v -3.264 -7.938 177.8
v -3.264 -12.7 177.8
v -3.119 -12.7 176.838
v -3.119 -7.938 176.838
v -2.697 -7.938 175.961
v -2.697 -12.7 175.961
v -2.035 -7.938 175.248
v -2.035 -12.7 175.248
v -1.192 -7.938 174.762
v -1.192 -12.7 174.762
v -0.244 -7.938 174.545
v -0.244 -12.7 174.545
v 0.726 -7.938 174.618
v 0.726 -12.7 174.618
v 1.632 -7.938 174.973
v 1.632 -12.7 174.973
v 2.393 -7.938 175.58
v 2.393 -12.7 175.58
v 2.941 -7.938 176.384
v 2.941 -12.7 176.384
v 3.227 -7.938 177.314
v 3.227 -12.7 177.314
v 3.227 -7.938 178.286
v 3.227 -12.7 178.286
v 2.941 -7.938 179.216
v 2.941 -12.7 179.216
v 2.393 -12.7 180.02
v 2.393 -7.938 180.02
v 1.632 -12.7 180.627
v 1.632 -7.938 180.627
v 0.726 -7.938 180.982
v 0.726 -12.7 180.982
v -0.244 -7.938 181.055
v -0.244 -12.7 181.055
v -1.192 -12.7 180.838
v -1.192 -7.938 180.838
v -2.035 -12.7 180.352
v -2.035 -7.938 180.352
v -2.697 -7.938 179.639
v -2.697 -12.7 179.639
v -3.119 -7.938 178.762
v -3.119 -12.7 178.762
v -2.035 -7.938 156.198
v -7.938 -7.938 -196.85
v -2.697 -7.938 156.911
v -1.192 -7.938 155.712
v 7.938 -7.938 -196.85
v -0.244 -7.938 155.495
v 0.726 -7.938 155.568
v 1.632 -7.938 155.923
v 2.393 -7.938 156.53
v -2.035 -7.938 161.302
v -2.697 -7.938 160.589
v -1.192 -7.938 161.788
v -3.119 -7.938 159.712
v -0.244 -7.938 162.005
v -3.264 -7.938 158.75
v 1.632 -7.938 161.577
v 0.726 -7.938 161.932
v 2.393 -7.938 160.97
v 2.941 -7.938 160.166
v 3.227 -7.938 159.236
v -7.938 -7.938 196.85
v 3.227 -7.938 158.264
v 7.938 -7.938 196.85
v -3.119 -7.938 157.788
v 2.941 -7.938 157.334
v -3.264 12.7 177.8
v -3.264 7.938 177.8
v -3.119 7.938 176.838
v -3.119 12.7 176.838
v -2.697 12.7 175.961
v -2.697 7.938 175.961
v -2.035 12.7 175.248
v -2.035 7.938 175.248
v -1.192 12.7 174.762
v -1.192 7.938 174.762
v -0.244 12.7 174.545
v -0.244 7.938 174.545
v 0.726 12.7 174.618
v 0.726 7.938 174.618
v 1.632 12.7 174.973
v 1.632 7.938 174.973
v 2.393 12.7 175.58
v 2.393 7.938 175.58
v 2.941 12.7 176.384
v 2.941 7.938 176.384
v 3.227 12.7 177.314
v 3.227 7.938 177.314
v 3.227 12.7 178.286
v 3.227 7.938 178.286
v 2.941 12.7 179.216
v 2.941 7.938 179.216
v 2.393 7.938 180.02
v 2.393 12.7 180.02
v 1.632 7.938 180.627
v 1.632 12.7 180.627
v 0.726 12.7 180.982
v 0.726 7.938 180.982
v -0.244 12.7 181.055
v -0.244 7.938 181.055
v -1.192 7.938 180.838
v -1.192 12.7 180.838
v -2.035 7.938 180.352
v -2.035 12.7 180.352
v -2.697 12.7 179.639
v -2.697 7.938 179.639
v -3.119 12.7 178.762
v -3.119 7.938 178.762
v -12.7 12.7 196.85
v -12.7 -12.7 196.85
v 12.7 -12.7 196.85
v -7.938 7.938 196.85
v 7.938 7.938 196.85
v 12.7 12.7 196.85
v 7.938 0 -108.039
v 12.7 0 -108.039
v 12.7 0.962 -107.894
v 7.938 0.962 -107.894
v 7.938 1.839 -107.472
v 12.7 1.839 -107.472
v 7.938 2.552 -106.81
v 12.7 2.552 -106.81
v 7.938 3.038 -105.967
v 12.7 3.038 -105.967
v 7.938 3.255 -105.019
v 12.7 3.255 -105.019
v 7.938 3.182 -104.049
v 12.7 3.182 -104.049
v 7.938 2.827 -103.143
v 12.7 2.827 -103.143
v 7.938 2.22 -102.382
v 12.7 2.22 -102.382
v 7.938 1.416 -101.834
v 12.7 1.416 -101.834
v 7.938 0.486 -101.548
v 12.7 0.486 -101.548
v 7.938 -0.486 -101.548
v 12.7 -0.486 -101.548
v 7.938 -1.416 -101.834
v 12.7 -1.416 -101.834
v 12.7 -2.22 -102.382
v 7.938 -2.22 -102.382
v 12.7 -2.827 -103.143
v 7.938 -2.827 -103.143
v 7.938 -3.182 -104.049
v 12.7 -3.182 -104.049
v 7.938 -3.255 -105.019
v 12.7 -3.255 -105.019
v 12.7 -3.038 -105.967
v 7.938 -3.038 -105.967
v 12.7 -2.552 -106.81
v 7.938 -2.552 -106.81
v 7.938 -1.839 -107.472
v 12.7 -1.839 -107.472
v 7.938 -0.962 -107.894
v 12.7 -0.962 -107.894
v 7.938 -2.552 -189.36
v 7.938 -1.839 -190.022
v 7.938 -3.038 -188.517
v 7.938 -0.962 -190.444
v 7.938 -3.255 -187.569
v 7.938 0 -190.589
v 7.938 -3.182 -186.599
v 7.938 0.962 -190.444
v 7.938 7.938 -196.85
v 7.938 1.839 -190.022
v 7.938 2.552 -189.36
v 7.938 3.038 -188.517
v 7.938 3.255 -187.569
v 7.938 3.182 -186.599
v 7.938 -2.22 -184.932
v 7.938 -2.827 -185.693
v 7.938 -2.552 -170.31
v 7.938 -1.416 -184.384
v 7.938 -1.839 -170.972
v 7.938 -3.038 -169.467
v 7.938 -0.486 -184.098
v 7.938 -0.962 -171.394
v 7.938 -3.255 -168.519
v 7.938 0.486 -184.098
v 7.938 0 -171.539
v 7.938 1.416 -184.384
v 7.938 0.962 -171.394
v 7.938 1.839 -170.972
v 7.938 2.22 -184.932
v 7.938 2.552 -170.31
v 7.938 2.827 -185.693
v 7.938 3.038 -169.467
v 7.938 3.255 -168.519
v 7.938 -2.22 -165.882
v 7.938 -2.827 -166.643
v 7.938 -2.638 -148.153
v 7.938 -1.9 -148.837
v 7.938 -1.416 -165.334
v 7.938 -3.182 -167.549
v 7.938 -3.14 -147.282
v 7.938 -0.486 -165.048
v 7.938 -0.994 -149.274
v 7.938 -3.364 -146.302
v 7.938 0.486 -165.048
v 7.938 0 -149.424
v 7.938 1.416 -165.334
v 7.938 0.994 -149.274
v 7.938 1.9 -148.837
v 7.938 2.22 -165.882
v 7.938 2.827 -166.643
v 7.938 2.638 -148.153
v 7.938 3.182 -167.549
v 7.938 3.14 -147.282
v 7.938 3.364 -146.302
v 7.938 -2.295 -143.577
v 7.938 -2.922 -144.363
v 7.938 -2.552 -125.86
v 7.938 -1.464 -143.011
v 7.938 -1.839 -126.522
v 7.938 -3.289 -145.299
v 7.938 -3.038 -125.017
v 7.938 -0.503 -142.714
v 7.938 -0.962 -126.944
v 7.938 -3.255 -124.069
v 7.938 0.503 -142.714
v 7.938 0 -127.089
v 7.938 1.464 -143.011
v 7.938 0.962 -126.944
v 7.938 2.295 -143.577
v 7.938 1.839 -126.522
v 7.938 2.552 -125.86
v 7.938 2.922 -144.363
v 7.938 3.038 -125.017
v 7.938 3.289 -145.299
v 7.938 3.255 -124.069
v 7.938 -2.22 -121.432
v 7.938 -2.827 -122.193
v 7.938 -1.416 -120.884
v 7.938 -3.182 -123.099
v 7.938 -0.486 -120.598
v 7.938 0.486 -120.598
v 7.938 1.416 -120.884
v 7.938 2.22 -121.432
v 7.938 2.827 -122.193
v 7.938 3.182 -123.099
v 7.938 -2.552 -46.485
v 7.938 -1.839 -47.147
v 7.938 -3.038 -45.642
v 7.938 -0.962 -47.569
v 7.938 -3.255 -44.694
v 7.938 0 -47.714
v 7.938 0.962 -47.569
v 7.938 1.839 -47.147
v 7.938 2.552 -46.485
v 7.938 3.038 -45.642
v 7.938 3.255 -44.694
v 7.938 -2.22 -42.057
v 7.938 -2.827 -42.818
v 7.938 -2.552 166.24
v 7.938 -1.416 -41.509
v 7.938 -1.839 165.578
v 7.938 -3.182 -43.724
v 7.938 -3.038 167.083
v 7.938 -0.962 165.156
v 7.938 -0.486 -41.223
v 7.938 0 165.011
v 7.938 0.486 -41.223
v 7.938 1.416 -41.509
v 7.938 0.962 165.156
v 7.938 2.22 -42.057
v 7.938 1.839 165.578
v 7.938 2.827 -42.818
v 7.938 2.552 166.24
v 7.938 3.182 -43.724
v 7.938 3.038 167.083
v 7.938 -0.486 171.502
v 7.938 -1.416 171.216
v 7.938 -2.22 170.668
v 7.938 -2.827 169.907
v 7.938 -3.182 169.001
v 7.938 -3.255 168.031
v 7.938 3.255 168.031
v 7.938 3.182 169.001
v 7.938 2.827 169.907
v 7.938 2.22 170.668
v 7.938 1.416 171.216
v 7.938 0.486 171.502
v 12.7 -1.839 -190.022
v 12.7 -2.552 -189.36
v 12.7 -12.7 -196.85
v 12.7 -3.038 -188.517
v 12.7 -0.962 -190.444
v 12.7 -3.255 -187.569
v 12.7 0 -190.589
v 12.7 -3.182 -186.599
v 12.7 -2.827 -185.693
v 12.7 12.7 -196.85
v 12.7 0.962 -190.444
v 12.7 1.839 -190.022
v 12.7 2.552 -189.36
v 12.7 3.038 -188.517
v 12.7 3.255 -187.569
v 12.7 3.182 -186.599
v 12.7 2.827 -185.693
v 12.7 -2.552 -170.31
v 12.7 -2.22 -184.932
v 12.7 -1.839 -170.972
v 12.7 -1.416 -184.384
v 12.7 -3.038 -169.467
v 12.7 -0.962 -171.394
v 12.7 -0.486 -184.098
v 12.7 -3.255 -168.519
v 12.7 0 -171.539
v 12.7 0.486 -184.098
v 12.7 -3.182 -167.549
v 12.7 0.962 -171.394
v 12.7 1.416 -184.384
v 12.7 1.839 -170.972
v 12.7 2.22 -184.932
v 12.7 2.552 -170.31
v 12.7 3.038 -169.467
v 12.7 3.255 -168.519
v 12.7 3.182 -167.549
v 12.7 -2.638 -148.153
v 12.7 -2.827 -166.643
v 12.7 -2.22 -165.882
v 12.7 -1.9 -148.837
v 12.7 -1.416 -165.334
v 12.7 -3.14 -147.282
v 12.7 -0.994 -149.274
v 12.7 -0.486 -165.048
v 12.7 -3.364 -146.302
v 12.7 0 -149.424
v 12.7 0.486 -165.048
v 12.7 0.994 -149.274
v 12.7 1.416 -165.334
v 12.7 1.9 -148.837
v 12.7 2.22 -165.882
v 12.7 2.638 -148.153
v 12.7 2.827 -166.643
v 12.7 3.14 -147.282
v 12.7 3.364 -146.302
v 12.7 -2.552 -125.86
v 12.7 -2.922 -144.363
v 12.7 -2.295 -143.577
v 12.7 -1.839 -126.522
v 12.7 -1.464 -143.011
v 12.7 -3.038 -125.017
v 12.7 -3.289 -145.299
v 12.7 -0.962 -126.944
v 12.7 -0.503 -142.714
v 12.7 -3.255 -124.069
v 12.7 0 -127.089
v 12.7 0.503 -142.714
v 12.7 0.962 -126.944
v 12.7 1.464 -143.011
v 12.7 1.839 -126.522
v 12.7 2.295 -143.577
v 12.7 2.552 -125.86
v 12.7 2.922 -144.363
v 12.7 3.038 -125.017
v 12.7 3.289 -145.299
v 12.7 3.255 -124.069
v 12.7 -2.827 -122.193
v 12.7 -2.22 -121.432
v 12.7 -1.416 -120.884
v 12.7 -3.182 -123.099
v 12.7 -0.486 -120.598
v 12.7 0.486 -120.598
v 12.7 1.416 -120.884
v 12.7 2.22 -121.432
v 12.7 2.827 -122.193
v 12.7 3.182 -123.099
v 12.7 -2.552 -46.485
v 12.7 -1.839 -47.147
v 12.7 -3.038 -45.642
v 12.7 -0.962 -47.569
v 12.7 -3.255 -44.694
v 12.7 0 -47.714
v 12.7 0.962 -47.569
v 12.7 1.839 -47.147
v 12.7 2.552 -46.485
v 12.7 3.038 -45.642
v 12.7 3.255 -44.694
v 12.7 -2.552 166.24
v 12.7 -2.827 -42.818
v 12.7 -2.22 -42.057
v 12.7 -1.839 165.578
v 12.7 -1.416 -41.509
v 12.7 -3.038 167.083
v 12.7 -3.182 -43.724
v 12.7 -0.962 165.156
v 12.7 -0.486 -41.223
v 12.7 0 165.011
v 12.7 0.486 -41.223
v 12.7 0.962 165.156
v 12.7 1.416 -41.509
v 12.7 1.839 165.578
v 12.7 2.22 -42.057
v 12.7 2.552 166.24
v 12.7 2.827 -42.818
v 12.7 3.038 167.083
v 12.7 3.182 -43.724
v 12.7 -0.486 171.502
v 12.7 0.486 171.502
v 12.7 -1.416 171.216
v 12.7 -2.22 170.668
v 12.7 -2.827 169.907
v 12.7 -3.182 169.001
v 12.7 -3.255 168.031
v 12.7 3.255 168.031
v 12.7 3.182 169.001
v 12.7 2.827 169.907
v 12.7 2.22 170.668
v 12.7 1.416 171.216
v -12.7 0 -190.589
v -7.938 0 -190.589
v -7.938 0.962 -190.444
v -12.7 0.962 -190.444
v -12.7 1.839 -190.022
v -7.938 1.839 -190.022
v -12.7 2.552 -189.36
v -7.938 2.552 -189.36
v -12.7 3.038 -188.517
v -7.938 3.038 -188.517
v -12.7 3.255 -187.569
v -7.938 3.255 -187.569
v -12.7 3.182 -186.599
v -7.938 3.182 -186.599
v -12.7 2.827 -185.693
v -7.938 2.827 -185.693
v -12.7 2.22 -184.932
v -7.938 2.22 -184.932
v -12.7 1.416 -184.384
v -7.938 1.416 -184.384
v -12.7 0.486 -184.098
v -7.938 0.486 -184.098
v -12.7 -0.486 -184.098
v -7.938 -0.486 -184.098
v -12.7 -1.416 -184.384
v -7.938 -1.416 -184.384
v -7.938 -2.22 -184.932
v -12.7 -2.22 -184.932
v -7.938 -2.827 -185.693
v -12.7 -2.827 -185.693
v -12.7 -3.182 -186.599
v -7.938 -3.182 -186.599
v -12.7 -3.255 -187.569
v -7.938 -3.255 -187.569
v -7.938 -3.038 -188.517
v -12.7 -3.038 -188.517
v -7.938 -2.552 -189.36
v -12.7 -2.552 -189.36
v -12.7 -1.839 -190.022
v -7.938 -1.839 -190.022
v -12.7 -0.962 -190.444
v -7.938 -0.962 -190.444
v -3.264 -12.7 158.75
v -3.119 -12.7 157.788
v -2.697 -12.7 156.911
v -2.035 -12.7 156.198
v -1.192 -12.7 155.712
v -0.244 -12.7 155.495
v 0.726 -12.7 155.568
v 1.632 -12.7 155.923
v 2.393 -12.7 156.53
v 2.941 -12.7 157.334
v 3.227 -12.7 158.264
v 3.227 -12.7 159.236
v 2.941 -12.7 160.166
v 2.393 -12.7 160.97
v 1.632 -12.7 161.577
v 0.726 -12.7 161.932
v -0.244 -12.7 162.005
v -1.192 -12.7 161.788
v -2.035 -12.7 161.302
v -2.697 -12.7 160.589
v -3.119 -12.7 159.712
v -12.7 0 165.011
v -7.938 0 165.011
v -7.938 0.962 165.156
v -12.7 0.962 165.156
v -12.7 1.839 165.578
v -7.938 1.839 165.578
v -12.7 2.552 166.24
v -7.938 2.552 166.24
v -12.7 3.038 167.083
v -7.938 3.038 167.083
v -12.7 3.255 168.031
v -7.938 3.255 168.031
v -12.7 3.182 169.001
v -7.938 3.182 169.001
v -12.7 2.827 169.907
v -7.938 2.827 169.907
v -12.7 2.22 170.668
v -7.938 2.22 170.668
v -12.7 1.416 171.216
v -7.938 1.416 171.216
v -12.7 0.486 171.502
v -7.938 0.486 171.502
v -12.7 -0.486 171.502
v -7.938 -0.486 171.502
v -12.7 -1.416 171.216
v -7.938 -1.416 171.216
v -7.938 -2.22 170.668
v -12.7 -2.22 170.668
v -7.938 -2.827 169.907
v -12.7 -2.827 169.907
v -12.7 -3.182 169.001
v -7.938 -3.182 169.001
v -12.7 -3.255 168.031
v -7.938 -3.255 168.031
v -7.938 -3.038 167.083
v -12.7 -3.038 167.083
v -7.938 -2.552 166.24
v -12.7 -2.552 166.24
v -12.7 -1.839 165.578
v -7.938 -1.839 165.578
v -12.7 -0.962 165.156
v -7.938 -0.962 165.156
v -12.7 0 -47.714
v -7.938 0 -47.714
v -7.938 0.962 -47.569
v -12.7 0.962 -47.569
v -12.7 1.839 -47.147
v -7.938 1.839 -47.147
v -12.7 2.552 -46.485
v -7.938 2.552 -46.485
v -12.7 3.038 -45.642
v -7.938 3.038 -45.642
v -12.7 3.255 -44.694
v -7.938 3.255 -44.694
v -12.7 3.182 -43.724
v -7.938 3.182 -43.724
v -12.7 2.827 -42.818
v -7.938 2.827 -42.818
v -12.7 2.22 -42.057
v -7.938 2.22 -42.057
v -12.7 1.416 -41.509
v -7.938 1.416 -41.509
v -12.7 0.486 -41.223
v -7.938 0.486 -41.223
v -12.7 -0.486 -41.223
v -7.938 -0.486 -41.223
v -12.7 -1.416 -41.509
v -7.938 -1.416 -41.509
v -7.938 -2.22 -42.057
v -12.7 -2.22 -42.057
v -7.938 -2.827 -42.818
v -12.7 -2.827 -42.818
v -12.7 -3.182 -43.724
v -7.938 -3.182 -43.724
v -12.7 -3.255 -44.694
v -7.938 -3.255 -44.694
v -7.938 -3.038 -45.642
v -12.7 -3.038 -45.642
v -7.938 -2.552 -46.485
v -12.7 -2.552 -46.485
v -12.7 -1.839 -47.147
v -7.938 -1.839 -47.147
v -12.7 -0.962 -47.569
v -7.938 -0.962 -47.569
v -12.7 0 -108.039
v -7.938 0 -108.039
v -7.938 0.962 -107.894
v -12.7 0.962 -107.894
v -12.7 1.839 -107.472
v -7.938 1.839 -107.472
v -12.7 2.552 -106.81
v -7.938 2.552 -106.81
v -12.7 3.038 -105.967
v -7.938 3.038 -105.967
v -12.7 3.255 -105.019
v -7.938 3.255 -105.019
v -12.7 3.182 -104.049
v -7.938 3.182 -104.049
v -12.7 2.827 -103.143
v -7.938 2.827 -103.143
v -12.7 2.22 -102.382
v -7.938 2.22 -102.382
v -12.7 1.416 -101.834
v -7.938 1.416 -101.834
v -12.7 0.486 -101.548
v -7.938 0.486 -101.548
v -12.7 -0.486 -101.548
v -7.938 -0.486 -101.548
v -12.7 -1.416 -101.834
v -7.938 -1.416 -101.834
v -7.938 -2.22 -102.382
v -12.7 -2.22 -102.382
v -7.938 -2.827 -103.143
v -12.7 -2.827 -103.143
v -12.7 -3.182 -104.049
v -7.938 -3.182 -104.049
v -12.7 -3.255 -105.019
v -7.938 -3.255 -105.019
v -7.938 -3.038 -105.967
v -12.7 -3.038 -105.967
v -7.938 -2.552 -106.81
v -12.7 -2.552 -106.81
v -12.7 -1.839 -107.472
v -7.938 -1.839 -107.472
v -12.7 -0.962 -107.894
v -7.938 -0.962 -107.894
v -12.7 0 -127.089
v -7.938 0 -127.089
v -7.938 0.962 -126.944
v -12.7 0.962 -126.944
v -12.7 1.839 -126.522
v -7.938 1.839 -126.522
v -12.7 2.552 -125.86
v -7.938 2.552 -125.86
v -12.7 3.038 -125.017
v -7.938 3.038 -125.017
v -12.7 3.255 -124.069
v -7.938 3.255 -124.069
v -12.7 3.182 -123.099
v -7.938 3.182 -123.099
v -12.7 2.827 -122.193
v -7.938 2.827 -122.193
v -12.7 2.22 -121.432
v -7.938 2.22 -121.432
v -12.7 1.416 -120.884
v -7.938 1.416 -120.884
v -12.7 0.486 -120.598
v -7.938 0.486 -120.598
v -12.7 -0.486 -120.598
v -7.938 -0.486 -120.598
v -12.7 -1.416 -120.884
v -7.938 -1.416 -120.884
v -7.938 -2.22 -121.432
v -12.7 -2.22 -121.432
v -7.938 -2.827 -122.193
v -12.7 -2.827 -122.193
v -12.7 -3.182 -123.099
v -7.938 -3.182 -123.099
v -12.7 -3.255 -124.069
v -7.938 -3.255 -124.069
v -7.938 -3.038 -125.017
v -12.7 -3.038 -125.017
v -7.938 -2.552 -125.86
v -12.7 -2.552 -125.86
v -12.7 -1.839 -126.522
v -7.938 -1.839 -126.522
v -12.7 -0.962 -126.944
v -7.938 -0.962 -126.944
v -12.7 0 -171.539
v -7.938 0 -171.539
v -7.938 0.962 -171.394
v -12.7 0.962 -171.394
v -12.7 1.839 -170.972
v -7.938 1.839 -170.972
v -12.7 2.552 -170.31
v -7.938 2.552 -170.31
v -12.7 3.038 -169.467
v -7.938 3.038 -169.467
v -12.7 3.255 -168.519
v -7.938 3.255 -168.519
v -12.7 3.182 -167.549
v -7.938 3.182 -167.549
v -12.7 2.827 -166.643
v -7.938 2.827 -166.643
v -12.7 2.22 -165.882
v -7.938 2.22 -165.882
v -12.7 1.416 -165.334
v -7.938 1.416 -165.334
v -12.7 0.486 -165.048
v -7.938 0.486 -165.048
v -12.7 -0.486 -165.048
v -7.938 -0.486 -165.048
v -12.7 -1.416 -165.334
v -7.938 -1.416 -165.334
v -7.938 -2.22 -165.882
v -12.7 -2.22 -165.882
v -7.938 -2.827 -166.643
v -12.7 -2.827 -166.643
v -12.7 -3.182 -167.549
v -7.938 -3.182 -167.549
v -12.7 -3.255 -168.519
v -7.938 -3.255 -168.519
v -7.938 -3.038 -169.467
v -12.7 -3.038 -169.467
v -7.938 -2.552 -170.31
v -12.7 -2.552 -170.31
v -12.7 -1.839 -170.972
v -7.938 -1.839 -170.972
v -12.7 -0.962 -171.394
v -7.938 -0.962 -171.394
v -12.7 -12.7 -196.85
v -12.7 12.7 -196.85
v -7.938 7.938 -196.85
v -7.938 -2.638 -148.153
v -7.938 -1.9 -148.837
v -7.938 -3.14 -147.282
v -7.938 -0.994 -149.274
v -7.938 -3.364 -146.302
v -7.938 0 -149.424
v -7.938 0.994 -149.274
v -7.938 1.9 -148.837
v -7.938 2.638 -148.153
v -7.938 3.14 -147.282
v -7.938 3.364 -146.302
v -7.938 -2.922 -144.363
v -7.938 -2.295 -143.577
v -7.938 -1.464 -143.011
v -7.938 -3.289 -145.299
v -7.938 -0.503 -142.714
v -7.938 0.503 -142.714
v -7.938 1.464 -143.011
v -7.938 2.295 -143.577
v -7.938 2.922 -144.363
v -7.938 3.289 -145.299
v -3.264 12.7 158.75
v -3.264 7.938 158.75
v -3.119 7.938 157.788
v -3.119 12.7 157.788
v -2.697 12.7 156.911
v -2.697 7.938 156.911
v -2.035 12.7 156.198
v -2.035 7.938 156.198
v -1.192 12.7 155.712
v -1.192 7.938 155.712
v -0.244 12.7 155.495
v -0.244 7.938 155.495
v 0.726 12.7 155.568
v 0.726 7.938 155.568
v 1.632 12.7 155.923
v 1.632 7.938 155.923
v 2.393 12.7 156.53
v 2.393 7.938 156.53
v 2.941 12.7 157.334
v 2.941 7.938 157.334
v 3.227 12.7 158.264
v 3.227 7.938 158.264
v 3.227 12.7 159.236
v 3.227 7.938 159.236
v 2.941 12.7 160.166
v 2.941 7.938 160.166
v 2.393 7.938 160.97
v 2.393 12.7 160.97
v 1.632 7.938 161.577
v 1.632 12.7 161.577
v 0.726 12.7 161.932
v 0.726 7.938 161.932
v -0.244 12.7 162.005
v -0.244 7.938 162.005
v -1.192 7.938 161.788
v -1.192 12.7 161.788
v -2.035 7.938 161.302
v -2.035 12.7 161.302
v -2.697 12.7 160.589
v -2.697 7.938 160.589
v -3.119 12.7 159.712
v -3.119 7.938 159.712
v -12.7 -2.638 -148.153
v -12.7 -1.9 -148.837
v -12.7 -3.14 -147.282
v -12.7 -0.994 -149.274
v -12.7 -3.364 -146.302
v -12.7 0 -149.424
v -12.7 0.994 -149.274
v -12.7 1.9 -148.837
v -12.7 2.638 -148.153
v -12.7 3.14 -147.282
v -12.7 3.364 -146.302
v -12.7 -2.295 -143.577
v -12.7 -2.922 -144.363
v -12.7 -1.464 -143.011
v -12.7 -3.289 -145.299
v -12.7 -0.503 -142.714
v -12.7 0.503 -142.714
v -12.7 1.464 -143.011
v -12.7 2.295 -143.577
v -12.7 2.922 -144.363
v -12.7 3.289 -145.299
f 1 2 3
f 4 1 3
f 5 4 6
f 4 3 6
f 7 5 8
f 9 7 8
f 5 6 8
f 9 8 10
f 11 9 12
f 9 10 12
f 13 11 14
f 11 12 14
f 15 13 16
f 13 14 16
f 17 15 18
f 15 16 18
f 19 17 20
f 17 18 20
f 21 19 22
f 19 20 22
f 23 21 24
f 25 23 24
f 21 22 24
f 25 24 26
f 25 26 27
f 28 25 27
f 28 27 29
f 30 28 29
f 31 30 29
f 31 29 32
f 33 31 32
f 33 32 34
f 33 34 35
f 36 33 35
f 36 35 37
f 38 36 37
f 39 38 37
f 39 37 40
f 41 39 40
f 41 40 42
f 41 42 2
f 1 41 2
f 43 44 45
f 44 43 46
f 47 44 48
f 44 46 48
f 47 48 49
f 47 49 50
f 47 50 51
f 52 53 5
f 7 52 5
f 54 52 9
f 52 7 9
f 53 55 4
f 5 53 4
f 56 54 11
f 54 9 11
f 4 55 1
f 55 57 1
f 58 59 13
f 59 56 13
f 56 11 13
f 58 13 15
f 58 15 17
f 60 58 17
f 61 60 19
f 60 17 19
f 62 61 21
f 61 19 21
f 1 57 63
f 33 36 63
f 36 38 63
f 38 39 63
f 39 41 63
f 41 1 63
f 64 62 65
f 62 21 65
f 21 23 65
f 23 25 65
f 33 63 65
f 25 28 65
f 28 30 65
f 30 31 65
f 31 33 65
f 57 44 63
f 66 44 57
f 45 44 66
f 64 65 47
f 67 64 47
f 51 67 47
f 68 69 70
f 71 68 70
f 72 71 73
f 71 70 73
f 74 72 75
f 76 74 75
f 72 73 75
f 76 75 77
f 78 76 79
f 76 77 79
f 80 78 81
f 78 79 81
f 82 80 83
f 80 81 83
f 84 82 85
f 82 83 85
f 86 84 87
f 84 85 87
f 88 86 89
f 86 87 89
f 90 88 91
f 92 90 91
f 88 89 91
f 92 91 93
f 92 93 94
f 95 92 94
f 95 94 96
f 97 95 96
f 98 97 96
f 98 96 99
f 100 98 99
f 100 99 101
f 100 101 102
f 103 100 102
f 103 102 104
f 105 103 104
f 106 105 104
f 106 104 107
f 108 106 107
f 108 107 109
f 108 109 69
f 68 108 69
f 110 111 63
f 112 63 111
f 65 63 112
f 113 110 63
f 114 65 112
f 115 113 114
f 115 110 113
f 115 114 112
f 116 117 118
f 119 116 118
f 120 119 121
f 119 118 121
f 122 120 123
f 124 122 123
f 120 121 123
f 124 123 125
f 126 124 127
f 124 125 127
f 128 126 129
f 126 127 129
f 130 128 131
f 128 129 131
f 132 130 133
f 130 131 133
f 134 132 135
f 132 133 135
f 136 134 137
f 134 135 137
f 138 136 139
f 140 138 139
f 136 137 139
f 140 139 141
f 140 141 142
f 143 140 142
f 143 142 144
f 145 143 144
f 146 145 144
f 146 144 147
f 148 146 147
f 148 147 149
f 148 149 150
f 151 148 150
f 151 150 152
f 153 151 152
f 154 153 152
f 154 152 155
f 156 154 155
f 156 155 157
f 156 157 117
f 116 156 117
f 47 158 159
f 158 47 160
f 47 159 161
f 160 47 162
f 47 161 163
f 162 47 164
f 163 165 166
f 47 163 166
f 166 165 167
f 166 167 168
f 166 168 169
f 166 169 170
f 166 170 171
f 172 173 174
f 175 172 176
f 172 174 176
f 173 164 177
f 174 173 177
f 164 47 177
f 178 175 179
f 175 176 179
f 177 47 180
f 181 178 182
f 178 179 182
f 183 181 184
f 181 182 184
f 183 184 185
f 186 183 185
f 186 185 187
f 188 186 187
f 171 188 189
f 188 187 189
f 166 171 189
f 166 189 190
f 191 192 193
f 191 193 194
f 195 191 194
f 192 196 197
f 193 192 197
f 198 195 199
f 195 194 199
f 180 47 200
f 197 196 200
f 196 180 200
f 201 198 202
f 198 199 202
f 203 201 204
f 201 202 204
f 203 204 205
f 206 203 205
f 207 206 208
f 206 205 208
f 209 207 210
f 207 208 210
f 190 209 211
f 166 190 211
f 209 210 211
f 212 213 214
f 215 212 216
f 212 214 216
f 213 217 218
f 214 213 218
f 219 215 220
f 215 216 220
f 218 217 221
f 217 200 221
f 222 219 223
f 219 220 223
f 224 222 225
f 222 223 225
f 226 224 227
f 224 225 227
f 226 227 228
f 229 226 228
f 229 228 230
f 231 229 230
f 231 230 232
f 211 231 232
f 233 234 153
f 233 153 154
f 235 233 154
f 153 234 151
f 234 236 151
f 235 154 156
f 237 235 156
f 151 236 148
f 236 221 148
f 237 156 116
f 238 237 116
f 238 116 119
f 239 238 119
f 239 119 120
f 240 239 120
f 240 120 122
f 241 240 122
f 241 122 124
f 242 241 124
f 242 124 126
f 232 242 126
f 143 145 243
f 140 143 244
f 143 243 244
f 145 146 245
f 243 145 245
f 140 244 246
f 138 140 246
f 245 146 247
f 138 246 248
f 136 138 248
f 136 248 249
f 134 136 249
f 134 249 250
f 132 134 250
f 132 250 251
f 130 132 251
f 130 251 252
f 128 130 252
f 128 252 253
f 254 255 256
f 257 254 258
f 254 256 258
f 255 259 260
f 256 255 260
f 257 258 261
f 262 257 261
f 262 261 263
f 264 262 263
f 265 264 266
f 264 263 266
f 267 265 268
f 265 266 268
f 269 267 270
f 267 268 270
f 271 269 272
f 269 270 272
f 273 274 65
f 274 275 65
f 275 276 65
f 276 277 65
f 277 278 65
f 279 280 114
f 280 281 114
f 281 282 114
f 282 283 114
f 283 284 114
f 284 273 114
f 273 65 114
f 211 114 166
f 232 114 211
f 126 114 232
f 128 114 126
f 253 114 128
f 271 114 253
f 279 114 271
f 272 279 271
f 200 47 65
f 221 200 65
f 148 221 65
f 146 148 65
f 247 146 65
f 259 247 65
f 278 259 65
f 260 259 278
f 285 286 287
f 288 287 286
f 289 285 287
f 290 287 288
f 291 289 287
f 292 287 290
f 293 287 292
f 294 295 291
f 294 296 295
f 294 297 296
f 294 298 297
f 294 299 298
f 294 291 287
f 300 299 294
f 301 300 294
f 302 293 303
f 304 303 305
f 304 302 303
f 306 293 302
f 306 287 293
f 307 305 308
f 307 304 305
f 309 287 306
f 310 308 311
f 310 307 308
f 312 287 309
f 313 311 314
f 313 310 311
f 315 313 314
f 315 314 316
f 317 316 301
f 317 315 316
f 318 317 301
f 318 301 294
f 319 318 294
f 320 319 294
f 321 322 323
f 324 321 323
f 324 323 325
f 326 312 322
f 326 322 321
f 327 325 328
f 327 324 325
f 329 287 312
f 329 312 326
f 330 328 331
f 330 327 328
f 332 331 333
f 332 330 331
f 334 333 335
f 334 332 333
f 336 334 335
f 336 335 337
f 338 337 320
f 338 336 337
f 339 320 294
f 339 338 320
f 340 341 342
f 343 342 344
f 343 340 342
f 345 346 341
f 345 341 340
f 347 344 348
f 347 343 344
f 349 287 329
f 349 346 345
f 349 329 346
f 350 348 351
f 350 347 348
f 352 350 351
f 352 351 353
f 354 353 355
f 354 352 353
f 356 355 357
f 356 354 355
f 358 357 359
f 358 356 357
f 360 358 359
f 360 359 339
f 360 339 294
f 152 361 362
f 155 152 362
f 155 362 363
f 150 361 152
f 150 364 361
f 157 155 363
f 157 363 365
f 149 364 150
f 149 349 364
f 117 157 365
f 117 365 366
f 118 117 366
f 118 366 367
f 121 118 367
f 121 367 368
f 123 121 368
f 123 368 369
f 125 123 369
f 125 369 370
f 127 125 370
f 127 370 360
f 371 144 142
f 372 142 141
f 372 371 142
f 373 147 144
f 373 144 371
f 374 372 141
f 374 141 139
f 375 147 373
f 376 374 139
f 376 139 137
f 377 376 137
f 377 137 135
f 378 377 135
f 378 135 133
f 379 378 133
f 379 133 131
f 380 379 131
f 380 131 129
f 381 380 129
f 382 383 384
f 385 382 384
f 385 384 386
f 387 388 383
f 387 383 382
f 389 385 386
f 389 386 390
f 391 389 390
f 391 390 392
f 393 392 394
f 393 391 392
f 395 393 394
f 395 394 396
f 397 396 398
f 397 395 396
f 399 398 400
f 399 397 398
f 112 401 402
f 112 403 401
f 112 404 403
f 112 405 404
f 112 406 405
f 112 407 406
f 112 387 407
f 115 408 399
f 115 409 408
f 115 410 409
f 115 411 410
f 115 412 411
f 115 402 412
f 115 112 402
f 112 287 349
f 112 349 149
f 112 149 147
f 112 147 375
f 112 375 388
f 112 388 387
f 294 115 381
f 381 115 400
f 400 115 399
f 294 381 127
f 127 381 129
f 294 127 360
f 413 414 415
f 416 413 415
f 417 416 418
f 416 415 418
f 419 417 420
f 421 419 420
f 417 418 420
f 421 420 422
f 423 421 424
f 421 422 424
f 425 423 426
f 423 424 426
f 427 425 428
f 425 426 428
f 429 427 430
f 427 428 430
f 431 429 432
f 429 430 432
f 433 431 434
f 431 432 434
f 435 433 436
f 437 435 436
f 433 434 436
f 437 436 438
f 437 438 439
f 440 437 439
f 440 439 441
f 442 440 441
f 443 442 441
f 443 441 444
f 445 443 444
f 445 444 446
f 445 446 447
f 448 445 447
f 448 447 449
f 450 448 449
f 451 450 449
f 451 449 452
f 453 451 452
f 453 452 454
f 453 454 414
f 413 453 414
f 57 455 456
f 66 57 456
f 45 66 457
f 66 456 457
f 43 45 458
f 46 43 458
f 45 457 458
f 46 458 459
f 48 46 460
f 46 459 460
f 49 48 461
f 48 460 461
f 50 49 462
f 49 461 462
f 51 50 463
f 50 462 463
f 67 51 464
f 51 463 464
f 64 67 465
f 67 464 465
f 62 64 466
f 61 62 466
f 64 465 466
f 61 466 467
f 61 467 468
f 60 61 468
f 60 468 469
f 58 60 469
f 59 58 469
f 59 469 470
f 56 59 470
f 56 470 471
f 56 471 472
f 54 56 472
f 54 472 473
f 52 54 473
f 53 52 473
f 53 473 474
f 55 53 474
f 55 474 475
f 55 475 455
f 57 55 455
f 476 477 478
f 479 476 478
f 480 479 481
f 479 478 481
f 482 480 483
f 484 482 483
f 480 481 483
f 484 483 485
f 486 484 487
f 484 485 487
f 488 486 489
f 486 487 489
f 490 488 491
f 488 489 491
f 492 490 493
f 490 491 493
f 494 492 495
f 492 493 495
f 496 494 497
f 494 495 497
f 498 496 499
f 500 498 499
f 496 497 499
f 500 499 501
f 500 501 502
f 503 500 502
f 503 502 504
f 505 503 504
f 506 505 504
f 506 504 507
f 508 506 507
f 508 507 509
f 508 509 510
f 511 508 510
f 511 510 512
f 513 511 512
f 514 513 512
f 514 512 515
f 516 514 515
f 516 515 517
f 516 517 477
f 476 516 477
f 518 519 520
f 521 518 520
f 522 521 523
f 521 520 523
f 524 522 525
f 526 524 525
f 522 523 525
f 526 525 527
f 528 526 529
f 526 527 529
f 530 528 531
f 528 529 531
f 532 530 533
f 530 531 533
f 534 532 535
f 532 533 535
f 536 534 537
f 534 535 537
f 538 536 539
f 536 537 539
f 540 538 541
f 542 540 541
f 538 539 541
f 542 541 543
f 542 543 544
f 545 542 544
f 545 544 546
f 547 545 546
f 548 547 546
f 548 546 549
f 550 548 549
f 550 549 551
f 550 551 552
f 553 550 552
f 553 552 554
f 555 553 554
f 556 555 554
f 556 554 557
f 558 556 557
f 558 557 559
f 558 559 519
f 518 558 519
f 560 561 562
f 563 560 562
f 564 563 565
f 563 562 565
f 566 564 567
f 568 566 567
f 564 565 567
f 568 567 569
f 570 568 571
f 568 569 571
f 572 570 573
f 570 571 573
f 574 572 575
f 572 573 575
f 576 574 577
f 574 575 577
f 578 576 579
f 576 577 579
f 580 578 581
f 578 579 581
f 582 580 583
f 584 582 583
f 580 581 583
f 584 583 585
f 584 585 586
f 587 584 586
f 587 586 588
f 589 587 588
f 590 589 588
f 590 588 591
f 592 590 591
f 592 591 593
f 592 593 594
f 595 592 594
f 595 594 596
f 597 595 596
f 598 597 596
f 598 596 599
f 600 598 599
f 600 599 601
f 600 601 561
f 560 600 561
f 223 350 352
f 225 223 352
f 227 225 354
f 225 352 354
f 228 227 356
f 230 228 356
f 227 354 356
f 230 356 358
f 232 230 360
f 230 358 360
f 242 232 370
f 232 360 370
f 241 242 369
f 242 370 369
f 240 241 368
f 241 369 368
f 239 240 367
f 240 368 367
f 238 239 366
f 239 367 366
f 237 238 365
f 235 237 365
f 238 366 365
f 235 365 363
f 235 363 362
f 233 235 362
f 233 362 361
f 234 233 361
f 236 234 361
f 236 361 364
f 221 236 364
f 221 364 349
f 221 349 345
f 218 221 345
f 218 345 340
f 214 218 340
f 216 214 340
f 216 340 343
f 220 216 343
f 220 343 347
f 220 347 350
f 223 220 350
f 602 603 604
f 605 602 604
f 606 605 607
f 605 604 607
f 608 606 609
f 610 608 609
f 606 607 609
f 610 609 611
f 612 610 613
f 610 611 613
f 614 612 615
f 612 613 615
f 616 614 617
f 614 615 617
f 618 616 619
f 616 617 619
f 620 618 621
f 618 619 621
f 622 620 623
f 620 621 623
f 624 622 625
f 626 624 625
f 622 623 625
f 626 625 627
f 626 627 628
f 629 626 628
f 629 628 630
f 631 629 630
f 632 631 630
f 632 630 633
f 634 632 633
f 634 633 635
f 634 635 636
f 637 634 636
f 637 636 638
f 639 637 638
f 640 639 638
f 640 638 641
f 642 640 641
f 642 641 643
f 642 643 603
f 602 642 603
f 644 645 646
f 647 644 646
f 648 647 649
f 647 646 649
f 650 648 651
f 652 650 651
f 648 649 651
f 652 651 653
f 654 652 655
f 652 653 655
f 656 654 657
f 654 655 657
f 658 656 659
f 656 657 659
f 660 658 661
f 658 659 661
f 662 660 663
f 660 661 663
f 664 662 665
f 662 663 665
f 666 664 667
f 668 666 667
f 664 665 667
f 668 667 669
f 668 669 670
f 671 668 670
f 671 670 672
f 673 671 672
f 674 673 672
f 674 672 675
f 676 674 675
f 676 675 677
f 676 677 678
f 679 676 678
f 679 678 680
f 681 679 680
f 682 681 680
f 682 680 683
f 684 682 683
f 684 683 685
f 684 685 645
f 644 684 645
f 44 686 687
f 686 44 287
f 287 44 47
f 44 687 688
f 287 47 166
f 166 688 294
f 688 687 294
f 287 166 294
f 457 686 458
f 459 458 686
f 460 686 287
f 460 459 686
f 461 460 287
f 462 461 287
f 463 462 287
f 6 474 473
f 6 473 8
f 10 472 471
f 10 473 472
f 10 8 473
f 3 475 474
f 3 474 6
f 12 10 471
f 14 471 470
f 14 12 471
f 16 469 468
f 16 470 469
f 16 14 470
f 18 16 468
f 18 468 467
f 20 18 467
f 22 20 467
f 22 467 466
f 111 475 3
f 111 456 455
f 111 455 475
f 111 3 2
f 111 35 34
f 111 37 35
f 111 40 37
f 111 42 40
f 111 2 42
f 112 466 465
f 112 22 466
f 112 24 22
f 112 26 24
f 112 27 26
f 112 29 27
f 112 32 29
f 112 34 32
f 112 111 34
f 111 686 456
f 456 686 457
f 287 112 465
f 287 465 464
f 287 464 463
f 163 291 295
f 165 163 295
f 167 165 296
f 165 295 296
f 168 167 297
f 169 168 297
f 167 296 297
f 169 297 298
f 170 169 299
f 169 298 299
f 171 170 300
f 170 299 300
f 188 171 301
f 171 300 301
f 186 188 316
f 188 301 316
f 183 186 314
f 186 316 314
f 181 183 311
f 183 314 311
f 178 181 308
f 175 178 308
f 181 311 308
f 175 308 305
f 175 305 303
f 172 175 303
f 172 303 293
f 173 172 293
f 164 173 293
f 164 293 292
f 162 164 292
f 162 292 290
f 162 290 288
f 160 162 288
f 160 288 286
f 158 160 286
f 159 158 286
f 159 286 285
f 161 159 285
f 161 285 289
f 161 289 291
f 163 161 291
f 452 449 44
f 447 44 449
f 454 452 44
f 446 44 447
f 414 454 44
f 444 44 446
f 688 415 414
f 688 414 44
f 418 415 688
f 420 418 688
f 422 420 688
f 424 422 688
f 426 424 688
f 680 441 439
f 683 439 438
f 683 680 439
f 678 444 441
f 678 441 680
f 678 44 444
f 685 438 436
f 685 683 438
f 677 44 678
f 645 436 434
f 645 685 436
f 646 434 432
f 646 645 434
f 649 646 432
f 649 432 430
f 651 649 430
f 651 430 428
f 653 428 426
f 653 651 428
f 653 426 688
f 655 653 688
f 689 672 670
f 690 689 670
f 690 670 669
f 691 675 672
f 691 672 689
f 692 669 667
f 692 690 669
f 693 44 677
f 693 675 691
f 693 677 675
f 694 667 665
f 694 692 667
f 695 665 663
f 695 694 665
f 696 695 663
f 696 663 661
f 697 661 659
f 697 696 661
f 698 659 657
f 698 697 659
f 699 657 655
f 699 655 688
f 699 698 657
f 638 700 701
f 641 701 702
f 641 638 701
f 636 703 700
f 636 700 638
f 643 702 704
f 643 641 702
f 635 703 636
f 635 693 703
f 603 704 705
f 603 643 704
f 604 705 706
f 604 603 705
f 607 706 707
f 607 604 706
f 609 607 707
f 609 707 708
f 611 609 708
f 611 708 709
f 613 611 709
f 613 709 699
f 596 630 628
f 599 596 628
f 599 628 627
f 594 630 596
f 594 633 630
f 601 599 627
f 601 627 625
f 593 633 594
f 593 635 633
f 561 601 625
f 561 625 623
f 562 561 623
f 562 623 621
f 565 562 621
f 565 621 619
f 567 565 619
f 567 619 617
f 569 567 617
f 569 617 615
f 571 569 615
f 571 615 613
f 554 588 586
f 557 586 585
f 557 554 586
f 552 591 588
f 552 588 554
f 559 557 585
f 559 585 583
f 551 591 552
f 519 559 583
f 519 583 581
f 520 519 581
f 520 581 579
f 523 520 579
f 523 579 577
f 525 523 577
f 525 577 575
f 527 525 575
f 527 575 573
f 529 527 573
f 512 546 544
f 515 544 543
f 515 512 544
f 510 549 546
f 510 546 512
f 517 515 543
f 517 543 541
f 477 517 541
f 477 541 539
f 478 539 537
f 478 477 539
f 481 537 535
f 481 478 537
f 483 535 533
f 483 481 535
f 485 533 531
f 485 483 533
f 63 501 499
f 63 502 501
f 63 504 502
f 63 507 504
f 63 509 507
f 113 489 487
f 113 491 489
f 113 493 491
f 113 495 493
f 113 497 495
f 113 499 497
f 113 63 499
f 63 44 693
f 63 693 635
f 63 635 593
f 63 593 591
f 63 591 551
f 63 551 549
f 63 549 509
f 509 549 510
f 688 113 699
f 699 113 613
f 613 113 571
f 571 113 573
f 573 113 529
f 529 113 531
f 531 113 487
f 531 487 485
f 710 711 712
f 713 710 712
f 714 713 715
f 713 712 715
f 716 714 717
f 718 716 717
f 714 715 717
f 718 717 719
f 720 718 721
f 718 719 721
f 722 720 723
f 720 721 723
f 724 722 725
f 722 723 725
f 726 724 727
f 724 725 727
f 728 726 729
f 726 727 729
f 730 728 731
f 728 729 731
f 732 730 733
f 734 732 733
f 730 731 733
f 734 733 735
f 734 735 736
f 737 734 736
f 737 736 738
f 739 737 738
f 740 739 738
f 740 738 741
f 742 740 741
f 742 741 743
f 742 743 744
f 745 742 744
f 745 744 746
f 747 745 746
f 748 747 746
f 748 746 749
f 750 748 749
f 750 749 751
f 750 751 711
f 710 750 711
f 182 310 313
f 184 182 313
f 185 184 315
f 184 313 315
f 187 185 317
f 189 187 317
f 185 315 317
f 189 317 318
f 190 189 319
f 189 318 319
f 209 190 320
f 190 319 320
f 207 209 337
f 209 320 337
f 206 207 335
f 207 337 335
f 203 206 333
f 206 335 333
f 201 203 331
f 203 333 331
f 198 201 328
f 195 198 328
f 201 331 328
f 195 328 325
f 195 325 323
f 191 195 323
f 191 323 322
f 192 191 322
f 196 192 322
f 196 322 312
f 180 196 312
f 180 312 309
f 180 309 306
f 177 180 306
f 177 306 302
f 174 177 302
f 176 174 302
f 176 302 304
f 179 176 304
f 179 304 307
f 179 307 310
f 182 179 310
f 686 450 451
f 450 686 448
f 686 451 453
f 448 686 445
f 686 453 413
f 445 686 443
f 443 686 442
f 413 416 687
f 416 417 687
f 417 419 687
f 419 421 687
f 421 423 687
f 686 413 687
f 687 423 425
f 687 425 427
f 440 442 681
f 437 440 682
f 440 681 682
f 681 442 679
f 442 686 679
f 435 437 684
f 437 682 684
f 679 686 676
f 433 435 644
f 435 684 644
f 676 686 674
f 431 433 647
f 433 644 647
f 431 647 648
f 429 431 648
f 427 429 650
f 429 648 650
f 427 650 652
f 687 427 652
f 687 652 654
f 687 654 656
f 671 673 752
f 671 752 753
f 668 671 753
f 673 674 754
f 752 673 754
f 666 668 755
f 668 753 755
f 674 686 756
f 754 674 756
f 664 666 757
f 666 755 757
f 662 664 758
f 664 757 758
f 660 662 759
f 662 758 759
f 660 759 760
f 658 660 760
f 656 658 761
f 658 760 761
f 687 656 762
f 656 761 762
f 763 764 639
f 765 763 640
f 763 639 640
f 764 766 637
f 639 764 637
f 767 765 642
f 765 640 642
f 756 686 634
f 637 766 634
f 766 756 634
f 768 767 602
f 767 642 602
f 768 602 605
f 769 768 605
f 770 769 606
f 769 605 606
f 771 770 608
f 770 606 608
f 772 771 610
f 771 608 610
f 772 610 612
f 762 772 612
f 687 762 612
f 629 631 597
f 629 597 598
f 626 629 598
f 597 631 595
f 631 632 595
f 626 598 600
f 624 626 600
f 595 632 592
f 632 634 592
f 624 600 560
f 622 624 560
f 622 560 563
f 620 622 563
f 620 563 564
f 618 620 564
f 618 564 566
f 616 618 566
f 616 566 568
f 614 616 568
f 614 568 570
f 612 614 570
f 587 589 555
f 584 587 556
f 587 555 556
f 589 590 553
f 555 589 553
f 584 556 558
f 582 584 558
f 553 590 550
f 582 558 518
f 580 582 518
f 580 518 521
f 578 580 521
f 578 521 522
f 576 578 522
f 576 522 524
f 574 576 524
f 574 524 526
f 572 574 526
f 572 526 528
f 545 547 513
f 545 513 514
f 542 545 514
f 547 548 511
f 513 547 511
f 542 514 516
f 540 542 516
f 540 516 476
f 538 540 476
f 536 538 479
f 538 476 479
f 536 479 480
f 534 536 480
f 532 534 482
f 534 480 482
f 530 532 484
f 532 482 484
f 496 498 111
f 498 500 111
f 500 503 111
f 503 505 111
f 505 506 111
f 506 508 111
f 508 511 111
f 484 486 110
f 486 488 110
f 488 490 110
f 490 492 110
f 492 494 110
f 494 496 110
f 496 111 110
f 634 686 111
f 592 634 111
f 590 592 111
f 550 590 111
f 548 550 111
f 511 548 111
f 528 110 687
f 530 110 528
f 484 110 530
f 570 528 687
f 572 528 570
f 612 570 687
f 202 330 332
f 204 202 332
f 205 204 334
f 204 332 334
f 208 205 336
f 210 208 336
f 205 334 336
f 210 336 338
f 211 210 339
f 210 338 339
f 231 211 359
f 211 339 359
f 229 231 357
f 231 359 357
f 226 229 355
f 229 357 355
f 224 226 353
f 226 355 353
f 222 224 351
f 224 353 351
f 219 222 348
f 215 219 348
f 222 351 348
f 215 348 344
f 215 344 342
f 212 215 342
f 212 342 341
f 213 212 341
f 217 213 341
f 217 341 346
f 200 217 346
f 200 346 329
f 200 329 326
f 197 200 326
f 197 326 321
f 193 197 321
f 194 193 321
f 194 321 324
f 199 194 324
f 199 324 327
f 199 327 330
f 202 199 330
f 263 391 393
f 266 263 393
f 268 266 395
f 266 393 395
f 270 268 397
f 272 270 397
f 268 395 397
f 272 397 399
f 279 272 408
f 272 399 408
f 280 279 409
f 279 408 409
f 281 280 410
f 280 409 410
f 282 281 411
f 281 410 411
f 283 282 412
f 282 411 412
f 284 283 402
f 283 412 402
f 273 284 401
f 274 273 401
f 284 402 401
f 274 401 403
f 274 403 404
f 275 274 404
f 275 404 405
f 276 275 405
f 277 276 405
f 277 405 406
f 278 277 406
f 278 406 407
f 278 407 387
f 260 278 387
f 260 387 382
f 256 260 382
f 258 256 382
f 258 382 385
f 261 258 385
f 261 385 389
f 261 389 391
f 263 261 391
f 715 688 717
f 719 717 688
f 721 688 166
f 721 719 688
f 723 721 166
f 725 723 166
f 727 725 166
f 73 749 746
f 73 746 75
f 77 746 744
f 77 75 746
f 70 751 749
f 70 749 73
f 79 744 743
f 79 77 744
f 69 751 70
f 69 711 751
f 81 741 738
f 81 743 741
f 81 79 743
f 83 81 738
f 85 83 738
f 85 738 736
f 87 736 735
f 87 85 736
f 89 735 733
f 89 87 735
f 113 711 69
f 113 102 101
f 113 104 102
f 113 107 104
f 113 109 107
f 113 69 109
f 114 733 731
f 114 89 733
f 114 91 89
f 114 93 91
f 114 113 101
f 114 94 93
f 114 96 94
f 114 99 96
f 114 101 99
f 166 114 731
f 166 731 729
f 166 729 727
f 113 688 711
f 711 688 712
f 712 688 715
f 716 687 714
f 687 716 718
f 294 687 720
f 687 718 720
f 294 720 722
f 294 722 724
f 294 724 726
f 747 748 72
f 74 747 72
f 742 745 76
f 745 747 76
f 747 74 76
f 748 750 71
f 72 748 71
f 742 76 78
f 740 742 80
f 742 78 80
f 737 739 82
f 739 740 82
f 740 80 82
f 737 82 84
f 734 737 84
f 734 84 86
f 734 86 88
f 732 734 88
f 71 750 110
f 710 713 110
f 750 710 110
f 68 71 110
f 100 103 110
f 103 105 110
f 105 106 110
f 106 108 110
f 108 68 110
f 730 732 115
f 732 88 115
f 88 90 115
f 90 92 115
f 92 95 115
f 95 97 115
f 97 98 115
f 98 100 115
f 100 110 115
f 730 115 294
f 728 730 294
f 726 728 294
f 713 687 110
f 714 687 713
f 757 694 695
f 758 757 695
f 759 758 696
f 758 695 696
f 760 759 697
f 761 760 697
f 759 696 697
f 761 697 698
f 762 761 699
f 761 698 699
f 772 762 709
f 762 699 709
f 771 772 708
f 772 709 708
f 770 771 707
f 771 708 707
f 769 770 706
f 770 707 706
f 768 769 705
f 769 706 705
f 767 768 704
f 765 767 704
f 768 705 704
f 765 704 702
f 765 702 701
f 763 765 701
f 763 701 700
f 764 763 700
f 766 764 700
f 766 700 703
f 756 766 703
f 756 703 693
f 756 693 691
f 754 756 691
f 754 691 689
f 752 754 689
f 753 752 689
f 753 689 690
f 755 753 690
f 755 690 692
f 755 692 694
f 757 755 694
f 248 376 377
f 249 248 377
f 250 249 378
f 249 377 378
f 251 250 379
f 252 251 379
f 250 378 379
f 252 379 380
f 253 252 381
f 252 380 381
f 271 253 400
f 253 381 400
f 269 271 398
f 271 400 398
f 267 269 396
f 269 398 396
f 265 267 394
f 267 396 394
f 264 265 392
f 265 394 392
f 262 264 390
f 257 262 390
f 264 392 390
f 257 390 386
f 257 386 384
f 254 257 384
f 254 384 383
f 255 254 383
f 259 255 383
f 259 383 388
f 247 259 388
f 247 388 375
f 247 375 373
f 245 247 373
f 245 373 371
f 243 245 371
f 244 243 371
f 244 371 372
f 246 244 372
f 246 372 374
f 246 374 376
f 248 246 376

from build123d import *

# Parameters (mm, degrees)
SKETCH4_W                        = 25.4
SKETCH4_H                        = 25.4
SKETCH4_W_2                      = 15.875
SKETCH4_H_2                      = 15.875
BOSS_EXTRUDE1_DEPTH              = 196.85
F_0_257_DIAMETER_HOLE1_D         = 6.5278
F_0_257_DIAMETER_HOLE2_D         = 6.5278
F_0_257_DIAMETER_HOLE3_D         = 6.5278
F_17_64_0_26563_DIAMETER_HOLE1_D = 6.747002


with BuildPart() as part:
    # Sketch4 → Boss-Extrude1 (new body, symmetric)
    with BuildSketch(Plane.XY):
        Rectangle(SKETCH4_W, SKETCH4_H)
        Rectangle(SKETCH4_W_2, SKETCH4_H_2, mode=Mode.SUBTRACT)
    extrude(amount=BOSS_EXTRUDE1_DEPTH, both=True)

    # F (0.257) Diameter Hole1 (through all)
    with Locations(Plane.ZY.offset(12.7)):
        with Locations((-104.775, 0), (-123.825, 0), (-168.275, 0), (-187.325, 0)):
            Hole(F_0_257_DIAMETER_HOLE1_D / 2)

    # F (0.257) Diameter Hole2 (through all)
    with Locations(Plane(origin=(0, 12.7, 0), x_dir=(1, 0, 0), z_dir=(0, 1, 0))):
        with Locations((0, -177.8), (0, -158.75)):
            Hole(F_0_257_DIAMETER_HOLE2_D / 2)

    # F (0.257) Diameter Hole3 (through all)
    with Locations(Plane.ZY.offset(12.7)):
        with Locations((168.275, 0), (-44.45, 0)):
            Hole(F_0_257_DIAMETER_HOLE3_D / 2)

    # 17/64 (0.26563) Diameter Hole1 (through all)
    with Locations(Plane.ZY.offset(12.7)):
        with Locations((-146.05, 0)):
            Hole(F_17_64_0_26563_DIAMETER_HOLE1_D / 2)


solid = part.part
